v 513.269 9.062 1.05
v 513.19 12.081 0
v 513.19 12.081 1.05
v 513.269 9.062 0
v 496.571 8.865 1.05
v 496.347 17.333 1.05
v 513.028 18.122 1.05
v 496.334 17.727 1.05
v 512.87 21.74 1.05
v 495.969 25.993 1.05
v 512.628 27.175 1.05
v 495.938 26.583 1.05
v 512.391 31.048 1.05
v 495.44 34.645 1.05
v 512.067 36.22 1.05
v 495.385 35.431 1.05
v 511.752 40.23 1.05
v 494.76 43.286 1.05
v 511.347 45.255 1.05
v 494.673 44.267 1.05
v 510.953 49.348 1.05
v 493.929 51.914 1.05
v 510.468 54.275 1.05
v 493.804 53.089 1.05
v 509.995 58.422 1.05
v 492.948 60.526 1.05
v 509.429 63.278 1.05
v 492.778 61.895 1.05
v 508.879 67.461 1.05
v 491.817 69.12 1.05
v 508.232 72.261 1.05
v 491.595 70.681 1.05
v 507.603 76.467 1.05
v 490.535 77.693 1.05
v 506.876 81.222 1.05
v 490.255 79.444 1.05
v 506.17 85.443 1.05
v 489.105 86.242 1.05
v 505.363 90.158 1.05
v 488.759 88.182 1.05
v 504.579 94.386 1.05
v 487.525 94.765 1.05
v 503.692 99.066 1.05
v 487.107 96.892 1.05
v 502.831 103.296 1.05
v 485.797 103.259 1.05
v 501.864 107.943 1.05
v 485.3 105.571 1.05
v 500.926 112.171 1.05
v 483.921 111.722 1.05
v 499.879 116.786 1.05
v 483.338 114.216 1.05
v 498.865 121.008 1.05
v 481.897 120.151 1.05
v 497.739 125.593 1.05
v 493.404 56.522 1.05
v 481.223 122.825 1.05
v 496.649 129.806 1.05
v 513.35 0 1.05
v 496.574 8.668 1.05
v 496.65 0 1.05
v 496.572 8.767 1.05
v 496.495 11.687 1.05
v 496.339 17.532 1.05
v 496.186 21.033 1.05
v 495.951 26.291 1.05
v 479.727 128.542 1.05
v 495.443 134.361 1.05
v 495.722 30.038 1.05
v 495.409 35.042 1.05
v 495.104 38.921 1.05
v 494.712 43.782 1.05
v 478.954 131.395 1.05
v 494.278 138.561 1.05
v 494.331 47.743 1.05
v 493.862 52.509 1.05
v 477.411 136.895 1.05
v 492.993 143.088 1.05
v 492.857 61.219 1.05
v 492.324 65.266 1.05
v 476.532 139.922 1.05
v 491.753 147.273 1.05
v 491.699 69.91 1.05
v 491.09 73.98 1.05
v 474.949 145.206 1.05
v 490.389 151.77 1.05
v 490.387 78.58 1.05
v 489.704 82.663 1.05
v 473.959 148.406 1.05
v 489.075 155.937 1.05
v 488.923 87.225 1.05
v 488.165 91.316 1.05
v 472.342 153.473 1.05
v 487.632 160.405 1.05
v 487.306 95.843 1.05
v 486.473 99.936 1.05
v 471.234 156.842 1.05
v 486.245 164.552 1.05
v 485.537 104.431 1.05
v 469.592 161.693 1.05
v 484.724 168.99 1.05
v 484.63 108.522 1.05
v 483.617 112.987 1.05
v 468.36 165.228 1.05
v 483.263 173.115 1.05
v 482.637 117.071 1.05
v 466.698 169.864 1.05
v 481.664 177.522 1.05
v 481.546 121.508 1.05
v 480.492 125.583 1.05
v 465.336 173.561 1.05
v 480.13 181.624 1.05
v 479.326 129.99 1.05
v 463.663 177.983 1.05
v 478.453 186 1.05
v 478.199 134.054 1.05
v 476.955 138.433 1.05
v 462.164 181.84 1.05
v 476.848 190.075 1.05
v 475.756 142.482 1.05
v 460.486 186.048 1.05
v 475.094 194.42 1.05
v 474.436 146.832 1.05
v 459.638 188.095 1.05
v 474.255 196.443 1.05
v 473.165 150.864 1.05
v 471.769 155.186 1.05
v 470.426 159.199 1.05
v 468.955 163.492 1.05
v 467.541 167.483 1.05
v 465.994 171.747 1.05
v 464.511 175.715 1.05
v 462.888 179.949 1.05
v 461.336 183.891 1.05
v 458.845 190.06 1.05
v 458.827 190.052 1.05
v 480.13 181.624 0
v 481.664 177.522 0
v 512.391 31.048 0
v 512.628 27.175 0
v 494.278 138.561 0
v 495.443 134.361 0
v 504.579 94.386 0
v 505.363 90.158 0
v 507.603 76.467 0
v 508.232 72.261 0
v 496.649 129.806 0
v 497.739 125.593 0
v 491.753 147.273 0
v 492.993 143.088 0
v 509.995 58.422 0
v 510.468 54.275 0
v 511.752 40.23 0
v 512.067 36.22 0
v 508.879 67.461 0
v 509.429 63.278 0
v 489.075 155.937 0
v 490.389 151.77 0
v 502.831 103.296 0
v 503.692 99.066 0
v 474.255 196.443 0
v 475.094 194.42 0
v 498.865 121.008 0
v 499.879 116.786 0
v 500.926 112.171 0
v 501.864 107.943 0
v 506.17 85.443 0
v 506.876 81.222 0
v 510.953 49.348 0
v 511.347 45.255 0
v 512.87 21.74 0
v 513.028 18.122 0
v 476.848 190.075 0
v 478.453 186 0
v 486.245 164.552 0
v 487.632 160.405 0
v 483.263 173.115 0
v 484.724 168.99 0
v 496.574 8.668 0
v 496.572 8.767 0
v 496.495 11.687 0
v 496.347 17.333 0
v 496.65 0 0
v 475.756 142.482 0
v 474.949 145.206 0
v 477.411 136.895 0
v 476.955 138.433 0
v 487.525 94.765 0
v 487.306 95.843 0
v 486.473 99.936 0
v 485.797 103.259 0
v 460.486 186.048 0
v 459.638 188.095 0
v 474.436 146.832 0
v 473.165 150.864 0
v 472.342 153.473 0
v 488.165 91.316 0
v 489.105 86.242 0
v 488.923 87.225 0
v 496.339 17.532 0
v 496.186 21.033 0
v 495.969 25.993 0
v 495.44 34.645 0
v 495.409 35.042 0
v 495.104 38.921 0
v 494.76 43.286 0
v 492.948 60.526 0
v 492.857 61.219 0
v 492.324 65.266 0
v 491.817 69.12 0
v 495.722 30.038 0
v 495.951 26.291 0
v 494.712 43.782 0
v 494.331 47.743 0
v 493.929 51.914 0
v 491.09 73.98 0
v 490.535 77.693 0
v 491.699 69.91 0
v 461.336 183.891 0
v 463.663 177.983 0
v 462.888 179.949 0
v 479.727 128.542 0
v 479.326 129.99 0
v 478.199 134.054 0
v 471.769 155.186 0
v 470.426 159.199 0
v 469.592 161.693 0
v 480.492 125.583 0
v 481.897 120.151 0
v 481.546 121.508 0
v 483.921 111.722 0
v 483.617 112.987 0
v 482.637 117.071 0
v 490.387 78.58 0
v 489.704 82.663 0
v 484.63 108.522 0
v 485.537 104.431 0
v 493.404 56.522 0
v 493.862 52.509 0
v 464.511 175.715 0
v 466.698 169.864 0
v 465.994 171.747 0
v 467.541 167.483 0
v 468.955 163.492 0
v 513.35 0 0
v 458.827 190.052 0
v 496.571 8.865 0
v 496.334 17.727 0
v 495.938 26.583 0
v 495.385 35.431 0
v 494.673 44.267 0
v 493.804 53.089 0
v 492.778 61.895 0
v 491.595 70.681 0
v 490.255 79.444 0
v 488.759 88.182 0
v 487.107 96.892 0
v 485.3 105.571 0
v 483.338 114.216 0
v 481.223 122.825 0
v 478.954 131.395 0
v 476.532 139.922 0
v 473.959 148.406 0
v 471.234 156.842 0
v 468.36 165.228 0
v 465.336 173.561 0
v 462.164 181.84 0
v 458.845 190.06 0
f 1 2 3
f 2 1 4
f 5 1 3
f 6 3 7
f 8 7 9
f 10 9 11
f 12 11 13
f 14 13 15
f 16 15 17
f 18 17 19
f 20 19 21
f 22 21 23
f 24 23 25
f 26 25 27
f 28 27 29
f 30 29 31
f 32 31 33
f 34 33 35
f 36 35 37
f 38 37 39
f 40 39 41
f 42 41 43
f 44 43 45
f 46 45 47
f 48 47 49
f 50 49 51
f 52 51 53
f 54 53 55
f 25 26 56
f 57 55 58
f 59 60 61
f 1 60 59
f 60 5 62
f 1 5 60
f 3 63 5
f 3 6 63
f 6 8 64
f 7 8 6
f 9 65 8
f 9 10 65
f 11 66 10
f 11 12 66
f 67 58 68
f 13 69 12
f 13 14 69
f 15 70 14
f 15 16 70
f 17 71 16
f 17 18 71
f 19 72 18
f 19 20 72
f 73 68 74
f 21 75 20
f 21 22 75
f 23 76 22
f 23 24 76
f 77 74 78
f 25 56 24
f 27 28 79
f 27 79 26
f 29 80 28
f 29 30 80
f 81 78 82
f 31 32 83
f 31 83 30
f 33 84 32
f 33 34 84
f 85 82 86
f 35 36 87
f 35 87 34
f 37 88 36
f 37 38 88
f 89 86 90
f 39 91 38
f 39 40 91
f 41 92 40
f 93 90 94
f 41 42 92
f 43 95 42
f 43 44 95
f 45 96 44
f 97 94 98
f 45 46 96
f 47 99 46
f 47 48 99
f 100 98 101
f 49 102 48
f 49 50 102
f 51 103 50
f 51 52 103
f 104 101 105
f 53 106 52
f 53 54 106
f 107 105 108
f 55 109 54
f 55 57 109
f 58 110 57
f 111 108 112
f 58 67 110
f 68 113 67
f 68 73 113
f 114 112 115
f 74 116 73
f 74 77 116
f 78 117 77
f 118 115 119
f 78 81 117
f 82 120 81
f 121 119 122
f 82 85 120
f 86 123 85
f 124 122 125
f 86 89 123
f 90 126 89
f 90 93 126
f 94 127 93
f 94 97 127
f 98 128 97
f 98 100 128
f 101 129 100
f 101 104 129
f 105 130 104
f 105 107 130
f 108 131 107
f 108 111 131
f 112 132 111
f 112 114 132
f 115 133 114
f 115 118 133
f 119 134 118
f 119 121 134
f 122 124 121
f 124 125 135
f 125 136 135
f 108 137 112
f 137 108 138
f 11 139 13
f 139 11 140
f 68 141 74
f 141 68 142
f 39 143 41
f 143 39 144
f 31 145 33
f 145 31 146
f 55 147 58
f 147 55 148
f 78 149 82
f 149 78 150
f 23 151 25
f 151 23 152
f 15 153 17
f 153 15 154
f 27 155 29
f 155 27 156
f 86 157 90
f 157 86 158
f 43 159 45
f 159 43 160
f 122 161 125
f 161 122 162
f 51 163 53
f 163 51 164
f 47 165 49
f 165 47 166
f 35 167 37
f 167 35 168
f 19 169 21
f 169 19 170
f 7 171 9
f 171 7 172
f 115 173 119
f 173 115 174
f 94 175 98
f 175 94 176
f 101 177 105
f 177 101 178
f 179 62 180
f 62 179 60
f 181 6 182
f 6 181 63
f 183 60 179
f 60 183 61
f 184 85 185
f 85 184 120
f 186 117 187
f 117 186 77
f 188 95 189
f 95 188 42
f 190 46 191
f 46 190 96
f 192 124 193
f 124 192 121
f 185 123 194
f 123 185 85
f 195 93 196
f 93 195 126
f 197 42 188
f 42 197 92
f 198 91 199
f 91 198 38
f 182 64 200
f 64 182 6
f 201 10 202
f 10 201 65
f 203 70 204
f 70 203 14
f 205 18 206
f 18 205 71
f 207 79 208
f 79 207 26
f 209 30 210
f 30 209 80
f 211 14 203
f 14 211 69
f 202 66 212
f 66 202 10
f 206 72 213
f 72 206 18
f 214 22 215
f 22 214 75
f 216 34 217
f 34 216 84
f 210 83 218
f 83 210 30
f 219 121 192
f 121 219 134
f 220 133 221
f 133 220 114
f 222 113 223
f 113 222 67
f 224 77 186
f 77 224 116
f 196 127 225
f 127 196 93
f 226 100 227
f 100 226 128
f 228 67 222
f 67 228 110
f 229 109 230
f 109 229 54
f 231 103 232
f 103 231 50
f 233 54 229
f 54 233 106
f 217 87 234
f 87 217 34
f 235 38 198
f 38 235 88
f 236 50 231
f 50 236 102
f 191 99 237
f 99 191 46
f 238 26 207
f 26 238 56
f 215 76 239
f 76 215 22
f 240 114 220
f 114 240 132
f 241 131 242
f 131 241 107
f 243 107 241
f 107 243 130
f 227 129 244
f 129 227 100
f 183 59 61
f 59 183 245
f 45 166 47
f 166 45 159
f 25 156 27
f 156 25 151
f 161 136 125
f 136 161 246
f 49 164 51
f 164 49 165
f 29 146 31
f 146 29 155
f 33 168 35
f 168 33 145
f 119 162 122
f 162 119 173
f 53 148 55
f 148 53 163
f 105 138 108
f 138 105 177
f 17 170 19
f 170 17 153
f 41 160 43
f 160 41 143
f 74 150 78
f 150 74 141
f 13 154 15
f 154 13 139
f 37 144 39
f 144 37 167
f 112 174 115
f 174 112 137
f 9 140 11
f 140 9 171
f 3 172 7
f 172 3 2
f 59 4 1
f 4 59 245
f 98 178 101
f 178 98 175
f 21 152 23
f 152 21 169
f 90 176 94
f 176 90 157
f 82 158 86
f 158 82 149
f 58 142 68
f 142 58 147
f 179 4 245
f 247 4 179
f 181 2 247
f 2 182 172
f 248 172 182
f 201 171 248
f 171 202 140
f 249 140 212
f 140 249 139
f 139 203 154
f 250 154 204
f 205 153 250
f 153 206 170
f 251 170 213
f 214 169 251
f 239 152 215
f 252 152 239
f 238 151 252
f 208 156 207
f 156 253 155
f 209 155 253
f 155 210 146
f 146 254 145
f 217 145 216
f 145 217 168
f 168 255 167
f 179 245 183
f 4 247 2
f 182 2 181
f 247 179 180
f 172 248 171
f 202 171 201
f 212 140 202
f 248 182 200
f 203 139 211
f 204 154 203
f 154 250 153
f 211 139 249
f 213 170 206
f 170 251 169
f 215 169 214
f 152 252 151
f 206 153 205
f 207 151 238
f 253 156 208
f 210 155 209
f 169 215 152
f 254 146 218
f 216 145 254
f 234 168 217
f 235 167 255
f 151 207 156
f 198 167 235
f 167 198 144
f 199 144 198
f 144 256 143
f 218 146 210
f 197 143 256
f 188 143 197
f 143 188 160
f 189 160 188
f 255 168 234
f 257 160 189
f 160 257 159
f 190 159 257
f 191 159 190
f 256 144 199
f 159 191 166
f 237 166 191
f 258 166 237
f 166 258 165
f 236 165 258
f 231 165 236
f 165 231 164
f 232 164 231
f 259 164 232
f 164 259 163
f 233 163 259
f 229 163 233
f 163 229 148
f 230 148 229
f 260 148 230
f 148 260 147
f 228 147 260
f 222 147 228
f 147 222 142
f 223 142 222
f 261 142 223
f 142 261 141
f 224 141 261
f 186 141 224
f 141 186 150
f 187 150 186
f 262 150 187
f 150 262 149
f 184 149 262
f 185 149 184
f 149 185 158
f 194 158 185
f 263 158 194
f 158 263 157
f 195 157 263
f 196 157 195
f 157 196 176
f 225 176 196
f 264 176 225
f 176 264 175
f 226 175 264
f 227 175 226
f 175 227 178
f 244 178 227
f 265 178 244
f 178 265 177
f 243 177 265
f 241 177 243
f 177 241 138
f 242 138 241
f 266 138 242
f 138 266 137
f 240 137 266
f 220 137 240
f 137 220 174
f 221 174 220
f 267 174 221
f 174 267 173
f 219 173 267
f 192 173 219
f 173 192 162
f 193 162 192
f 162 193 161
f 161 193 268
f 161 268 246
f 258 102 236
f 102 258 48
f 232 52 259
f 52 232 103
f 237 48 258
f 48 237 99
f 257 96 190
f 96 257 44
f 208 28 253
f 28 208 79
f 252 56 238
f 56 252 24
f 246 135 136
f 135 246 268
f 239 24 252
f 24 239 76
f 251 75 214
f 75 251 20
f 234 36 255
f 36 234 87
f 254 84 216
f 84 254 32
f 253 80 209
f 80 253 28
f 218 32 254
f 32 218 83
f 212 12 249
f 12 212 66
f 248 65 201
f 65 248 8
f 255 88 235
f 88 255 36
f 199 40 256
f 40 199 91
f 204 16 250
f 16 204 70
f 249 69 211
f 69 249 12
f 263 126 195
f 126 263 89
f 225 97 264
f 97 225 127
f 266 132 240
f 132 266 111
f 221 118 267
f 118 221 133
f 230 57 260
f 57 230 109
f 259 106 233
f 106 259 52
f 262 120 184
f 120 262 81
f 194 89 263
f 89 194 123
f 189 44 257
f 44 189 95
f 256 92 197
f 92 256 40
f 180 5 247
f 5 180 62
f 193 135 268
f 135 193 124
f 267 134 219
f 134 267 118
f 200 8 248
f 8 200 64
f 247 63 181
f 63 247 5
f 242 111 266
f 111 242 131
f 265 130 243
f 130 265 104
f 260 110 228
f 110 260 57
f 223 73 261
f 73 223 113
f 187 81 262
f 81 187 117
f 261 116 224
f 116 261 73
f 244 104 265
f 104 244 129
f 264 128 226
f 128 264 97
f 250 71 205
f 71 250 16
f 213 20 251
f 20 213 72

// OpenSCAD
$fn=360;
radius = 505;
width  = 16.7;
height = 2.1;
angle  = 22.5;

outerRadius = radius + (width / 2);
innerRadius = radius - (width / 2);

intersection() {
    difference() {
        cylinder(r=outerRadius, h=height, center=true);    
        cylinder(r=innerRadius, h=height, center=true);
    }
    difference() {
        rotate_extrude(angle=angle) square([outerRadius, height]);
        rotate_extrude(angle=angle) square([innerRadius, height]);

    }
}
